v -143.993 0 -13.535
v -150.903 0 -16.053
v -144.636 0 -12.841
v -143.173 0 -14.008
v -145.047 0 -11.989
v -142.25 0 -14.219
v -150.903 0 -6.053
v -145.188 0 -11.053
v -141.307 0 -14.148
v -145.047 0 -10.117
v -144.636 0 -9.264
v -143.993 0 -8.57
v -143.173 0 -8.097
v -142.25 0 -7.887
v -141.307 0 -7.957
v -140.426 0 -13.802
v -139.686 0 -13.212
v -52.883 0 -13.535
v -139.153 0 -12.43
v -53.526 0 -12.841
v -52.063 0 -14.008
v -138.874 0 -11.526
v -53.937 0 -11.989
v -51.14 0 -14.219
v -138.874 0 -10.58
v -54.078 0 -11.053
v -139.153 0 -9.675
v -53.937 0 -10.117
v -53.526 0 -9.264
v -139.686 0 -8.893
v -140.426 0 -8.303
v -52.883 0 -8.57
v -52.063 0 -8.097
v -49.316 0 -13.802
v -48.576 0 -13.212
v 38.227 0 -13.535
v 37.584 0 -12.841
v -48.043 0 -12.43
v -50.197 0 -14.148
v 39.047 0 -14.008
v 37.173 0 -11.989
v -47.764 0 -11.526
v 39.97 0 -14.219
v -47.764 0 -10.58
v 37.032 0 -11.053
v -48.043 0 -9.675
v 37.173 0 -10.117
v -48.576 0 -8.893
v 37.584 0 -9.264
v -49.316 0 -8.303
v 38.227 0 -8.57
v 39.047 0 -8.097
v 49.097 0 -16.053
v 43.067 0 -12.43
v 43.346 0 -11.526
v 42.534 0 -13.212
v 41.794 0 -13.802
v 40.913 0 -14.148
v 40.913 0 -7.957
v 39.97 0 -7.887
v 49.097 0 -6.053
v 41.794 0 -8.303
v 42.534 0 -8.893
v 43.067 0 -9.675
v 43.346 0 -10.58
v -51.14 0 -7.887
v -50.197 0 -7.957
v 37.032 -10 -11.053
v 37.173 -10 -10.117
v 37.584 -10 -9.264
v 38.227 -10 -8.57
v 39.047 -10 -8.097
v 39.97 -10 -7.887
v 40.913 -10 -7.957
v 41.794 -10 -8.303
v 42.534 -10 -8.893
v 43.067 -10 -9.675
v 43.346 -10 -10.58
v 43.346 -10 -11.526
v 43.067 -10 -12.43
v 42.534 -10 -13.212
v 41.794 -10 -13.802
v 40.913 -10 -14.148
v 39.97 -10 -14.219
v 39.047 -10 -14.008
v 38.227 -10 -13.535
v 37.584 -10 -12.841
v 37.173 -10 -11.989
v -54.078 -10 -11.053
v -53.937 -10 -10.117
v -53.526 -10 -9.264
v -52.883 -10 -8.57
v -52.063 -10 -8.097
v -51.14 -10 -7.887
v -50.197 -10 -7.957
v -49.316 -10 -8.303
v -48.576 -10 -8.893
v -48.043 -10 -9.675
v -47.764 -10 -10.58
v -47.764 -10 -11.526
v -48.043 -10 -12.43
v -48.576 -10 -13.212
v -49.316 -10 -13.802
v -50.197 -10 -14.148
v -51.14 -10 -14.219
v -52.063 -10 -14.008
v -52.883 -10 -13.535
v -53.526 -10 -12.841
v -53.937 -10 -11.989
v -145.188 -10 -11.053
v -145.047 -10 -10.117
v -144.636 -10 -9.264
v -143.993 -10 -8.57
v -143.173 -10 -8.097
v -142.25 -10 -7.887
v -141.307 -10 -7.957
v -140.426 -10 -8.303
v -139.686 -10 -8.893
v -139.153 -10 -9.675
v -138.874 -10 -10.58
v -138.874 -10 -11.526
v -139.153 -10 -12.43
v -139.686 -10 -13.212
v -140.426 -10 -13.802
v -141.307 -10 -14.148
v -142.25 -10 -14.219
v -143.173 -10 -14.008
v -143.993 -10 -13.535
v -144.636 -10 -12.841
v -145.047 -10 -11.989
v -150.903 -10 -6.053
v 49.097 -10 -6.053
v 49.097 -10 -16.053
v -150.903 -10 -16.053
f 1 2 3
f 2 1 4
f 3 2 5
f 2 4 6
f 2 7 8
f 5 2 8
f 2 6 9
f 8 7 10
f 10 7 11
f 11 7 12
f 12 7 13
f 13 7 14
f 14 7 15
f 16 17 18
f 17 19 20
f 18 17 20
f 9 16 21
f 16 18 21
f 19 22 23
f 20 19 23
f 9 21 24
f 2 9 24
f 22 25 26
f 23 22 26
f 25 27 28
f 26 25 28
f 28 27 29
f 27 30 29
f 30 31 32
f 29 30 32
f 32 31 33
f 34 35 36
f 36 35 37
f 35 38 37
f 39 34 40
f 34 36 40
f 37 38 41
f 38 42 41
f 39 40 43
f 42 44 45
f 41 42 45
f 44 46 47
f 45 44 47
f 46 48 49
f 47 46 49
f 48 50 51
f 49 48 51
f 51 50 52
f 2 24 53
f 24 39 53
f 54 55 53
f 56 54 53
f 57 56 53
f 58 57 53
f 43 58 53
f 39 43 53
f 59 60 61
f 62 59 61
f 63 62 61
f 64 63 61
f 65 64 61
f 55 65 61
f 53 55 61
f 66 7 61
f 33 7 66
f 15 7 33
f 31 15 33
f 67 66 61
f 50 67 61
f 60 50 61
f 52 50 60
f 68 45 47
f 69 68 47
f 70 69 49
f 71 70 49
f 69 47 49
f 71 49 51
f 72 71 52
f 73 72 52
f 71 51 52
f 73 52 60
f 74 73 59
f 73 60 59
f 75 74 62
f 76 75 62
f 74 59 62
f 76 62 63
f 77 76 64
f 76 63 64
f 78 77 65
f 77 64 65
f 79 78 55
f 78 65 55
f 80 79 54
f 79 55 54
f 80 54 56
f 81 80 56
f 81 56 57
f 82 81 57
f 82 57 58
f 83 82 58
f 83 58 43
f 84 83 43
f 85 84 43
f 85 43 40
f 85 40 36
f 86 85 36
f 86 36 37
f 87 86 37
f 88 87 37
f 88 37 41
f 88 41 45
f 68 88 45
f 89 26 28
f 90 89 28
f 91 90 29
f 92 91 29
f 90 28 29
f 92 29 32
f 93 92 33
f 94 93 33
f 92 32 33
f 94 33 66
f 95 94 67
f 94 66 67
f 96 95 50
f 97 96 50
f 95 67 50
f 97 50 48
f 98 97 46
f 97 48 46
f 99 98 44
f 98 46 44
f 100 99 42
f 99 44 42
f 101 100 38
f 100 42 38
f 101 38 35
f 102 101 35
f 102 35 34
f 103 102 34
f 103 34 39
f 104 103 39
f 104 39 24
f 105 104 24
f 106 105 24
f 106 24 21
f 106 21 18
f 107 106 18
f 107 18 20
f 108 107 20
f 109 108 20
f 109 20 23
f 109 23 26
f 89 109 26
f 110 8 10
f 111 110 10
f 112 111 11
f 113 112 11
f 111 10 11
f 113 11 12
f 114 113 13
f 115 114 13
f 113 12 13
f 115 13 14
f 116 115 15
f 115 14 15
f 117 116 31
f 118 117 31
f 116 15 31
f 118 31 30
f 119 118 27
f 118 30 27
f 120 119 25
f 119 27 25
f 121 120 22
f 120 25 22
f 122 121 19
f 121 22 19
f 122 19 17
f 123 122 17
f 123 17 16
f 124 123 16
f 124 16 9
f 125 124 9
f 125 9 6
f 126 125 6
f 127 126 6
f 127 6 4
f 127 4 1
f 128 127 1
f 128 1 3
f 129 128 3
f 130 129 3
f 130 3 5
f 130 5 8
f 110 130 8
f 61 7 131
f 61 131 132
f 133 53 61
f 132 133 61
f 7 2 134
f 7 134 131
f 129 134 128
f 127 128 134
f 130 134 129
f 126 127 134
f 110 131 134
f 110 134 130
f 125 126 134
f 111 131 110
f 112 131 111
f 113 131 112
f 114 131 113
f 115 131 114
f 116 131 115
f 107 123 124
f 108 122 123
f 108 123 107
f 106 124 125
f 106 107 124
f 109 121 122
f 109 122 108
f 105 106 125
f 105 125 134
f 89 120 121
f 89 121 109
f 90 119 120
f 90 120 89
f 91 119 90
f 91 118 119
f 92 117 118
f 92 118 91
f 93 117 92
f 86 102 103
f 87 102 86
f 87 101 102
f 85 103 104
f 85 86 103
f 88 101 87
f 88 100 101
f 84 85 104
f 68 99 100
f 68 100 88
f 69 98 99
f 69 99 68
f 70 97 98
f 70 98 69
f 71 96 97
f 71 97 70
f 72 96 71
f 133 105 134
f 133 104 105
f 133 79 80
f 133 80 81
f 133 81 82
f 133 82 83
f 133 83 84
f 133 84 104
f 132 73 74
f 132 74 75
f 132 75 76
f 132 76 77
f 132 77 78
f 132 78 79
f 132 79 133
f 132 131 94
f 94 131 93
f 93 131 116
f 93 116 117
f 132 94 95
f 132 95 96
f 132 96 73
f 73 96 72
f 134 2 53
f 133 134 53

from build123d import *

# Parameters (mm, degrees)
F0_W     = 200
F0_H     = 10
F1_DEPTH = 10
F3_D     = 6.35
F5_D     = 6.35
F7_D     = 6.35


with BuildPart() as f1:
    # F0 (on Front) → F1 (new body)
    with BuildSketch(Plane.XZ):
        with Locations((-50.903185, -11.052803)):
            Rectangle(F0_W, F0_H)
    extrude(amount=F1_DEPTH)

    # F3 (through all)
    with Locations(Plane.XZ.offset(10)):
        with Locations((-142.013185, -11.052803)):
            Hole(F3_D / 2)

    # F5 (through all)
    with Locations(Plane.XZ.offset(10)):
        with Locations((40.206815, -11.052803)):
            Hole(F5_D / 2)

    # F7 (through all)
    with Locations(Plane.XZ.offset(10)):
        with Locations((-50.903185, -11.052803)):
            Hole(F7_D / 2)


solid = f1.part
